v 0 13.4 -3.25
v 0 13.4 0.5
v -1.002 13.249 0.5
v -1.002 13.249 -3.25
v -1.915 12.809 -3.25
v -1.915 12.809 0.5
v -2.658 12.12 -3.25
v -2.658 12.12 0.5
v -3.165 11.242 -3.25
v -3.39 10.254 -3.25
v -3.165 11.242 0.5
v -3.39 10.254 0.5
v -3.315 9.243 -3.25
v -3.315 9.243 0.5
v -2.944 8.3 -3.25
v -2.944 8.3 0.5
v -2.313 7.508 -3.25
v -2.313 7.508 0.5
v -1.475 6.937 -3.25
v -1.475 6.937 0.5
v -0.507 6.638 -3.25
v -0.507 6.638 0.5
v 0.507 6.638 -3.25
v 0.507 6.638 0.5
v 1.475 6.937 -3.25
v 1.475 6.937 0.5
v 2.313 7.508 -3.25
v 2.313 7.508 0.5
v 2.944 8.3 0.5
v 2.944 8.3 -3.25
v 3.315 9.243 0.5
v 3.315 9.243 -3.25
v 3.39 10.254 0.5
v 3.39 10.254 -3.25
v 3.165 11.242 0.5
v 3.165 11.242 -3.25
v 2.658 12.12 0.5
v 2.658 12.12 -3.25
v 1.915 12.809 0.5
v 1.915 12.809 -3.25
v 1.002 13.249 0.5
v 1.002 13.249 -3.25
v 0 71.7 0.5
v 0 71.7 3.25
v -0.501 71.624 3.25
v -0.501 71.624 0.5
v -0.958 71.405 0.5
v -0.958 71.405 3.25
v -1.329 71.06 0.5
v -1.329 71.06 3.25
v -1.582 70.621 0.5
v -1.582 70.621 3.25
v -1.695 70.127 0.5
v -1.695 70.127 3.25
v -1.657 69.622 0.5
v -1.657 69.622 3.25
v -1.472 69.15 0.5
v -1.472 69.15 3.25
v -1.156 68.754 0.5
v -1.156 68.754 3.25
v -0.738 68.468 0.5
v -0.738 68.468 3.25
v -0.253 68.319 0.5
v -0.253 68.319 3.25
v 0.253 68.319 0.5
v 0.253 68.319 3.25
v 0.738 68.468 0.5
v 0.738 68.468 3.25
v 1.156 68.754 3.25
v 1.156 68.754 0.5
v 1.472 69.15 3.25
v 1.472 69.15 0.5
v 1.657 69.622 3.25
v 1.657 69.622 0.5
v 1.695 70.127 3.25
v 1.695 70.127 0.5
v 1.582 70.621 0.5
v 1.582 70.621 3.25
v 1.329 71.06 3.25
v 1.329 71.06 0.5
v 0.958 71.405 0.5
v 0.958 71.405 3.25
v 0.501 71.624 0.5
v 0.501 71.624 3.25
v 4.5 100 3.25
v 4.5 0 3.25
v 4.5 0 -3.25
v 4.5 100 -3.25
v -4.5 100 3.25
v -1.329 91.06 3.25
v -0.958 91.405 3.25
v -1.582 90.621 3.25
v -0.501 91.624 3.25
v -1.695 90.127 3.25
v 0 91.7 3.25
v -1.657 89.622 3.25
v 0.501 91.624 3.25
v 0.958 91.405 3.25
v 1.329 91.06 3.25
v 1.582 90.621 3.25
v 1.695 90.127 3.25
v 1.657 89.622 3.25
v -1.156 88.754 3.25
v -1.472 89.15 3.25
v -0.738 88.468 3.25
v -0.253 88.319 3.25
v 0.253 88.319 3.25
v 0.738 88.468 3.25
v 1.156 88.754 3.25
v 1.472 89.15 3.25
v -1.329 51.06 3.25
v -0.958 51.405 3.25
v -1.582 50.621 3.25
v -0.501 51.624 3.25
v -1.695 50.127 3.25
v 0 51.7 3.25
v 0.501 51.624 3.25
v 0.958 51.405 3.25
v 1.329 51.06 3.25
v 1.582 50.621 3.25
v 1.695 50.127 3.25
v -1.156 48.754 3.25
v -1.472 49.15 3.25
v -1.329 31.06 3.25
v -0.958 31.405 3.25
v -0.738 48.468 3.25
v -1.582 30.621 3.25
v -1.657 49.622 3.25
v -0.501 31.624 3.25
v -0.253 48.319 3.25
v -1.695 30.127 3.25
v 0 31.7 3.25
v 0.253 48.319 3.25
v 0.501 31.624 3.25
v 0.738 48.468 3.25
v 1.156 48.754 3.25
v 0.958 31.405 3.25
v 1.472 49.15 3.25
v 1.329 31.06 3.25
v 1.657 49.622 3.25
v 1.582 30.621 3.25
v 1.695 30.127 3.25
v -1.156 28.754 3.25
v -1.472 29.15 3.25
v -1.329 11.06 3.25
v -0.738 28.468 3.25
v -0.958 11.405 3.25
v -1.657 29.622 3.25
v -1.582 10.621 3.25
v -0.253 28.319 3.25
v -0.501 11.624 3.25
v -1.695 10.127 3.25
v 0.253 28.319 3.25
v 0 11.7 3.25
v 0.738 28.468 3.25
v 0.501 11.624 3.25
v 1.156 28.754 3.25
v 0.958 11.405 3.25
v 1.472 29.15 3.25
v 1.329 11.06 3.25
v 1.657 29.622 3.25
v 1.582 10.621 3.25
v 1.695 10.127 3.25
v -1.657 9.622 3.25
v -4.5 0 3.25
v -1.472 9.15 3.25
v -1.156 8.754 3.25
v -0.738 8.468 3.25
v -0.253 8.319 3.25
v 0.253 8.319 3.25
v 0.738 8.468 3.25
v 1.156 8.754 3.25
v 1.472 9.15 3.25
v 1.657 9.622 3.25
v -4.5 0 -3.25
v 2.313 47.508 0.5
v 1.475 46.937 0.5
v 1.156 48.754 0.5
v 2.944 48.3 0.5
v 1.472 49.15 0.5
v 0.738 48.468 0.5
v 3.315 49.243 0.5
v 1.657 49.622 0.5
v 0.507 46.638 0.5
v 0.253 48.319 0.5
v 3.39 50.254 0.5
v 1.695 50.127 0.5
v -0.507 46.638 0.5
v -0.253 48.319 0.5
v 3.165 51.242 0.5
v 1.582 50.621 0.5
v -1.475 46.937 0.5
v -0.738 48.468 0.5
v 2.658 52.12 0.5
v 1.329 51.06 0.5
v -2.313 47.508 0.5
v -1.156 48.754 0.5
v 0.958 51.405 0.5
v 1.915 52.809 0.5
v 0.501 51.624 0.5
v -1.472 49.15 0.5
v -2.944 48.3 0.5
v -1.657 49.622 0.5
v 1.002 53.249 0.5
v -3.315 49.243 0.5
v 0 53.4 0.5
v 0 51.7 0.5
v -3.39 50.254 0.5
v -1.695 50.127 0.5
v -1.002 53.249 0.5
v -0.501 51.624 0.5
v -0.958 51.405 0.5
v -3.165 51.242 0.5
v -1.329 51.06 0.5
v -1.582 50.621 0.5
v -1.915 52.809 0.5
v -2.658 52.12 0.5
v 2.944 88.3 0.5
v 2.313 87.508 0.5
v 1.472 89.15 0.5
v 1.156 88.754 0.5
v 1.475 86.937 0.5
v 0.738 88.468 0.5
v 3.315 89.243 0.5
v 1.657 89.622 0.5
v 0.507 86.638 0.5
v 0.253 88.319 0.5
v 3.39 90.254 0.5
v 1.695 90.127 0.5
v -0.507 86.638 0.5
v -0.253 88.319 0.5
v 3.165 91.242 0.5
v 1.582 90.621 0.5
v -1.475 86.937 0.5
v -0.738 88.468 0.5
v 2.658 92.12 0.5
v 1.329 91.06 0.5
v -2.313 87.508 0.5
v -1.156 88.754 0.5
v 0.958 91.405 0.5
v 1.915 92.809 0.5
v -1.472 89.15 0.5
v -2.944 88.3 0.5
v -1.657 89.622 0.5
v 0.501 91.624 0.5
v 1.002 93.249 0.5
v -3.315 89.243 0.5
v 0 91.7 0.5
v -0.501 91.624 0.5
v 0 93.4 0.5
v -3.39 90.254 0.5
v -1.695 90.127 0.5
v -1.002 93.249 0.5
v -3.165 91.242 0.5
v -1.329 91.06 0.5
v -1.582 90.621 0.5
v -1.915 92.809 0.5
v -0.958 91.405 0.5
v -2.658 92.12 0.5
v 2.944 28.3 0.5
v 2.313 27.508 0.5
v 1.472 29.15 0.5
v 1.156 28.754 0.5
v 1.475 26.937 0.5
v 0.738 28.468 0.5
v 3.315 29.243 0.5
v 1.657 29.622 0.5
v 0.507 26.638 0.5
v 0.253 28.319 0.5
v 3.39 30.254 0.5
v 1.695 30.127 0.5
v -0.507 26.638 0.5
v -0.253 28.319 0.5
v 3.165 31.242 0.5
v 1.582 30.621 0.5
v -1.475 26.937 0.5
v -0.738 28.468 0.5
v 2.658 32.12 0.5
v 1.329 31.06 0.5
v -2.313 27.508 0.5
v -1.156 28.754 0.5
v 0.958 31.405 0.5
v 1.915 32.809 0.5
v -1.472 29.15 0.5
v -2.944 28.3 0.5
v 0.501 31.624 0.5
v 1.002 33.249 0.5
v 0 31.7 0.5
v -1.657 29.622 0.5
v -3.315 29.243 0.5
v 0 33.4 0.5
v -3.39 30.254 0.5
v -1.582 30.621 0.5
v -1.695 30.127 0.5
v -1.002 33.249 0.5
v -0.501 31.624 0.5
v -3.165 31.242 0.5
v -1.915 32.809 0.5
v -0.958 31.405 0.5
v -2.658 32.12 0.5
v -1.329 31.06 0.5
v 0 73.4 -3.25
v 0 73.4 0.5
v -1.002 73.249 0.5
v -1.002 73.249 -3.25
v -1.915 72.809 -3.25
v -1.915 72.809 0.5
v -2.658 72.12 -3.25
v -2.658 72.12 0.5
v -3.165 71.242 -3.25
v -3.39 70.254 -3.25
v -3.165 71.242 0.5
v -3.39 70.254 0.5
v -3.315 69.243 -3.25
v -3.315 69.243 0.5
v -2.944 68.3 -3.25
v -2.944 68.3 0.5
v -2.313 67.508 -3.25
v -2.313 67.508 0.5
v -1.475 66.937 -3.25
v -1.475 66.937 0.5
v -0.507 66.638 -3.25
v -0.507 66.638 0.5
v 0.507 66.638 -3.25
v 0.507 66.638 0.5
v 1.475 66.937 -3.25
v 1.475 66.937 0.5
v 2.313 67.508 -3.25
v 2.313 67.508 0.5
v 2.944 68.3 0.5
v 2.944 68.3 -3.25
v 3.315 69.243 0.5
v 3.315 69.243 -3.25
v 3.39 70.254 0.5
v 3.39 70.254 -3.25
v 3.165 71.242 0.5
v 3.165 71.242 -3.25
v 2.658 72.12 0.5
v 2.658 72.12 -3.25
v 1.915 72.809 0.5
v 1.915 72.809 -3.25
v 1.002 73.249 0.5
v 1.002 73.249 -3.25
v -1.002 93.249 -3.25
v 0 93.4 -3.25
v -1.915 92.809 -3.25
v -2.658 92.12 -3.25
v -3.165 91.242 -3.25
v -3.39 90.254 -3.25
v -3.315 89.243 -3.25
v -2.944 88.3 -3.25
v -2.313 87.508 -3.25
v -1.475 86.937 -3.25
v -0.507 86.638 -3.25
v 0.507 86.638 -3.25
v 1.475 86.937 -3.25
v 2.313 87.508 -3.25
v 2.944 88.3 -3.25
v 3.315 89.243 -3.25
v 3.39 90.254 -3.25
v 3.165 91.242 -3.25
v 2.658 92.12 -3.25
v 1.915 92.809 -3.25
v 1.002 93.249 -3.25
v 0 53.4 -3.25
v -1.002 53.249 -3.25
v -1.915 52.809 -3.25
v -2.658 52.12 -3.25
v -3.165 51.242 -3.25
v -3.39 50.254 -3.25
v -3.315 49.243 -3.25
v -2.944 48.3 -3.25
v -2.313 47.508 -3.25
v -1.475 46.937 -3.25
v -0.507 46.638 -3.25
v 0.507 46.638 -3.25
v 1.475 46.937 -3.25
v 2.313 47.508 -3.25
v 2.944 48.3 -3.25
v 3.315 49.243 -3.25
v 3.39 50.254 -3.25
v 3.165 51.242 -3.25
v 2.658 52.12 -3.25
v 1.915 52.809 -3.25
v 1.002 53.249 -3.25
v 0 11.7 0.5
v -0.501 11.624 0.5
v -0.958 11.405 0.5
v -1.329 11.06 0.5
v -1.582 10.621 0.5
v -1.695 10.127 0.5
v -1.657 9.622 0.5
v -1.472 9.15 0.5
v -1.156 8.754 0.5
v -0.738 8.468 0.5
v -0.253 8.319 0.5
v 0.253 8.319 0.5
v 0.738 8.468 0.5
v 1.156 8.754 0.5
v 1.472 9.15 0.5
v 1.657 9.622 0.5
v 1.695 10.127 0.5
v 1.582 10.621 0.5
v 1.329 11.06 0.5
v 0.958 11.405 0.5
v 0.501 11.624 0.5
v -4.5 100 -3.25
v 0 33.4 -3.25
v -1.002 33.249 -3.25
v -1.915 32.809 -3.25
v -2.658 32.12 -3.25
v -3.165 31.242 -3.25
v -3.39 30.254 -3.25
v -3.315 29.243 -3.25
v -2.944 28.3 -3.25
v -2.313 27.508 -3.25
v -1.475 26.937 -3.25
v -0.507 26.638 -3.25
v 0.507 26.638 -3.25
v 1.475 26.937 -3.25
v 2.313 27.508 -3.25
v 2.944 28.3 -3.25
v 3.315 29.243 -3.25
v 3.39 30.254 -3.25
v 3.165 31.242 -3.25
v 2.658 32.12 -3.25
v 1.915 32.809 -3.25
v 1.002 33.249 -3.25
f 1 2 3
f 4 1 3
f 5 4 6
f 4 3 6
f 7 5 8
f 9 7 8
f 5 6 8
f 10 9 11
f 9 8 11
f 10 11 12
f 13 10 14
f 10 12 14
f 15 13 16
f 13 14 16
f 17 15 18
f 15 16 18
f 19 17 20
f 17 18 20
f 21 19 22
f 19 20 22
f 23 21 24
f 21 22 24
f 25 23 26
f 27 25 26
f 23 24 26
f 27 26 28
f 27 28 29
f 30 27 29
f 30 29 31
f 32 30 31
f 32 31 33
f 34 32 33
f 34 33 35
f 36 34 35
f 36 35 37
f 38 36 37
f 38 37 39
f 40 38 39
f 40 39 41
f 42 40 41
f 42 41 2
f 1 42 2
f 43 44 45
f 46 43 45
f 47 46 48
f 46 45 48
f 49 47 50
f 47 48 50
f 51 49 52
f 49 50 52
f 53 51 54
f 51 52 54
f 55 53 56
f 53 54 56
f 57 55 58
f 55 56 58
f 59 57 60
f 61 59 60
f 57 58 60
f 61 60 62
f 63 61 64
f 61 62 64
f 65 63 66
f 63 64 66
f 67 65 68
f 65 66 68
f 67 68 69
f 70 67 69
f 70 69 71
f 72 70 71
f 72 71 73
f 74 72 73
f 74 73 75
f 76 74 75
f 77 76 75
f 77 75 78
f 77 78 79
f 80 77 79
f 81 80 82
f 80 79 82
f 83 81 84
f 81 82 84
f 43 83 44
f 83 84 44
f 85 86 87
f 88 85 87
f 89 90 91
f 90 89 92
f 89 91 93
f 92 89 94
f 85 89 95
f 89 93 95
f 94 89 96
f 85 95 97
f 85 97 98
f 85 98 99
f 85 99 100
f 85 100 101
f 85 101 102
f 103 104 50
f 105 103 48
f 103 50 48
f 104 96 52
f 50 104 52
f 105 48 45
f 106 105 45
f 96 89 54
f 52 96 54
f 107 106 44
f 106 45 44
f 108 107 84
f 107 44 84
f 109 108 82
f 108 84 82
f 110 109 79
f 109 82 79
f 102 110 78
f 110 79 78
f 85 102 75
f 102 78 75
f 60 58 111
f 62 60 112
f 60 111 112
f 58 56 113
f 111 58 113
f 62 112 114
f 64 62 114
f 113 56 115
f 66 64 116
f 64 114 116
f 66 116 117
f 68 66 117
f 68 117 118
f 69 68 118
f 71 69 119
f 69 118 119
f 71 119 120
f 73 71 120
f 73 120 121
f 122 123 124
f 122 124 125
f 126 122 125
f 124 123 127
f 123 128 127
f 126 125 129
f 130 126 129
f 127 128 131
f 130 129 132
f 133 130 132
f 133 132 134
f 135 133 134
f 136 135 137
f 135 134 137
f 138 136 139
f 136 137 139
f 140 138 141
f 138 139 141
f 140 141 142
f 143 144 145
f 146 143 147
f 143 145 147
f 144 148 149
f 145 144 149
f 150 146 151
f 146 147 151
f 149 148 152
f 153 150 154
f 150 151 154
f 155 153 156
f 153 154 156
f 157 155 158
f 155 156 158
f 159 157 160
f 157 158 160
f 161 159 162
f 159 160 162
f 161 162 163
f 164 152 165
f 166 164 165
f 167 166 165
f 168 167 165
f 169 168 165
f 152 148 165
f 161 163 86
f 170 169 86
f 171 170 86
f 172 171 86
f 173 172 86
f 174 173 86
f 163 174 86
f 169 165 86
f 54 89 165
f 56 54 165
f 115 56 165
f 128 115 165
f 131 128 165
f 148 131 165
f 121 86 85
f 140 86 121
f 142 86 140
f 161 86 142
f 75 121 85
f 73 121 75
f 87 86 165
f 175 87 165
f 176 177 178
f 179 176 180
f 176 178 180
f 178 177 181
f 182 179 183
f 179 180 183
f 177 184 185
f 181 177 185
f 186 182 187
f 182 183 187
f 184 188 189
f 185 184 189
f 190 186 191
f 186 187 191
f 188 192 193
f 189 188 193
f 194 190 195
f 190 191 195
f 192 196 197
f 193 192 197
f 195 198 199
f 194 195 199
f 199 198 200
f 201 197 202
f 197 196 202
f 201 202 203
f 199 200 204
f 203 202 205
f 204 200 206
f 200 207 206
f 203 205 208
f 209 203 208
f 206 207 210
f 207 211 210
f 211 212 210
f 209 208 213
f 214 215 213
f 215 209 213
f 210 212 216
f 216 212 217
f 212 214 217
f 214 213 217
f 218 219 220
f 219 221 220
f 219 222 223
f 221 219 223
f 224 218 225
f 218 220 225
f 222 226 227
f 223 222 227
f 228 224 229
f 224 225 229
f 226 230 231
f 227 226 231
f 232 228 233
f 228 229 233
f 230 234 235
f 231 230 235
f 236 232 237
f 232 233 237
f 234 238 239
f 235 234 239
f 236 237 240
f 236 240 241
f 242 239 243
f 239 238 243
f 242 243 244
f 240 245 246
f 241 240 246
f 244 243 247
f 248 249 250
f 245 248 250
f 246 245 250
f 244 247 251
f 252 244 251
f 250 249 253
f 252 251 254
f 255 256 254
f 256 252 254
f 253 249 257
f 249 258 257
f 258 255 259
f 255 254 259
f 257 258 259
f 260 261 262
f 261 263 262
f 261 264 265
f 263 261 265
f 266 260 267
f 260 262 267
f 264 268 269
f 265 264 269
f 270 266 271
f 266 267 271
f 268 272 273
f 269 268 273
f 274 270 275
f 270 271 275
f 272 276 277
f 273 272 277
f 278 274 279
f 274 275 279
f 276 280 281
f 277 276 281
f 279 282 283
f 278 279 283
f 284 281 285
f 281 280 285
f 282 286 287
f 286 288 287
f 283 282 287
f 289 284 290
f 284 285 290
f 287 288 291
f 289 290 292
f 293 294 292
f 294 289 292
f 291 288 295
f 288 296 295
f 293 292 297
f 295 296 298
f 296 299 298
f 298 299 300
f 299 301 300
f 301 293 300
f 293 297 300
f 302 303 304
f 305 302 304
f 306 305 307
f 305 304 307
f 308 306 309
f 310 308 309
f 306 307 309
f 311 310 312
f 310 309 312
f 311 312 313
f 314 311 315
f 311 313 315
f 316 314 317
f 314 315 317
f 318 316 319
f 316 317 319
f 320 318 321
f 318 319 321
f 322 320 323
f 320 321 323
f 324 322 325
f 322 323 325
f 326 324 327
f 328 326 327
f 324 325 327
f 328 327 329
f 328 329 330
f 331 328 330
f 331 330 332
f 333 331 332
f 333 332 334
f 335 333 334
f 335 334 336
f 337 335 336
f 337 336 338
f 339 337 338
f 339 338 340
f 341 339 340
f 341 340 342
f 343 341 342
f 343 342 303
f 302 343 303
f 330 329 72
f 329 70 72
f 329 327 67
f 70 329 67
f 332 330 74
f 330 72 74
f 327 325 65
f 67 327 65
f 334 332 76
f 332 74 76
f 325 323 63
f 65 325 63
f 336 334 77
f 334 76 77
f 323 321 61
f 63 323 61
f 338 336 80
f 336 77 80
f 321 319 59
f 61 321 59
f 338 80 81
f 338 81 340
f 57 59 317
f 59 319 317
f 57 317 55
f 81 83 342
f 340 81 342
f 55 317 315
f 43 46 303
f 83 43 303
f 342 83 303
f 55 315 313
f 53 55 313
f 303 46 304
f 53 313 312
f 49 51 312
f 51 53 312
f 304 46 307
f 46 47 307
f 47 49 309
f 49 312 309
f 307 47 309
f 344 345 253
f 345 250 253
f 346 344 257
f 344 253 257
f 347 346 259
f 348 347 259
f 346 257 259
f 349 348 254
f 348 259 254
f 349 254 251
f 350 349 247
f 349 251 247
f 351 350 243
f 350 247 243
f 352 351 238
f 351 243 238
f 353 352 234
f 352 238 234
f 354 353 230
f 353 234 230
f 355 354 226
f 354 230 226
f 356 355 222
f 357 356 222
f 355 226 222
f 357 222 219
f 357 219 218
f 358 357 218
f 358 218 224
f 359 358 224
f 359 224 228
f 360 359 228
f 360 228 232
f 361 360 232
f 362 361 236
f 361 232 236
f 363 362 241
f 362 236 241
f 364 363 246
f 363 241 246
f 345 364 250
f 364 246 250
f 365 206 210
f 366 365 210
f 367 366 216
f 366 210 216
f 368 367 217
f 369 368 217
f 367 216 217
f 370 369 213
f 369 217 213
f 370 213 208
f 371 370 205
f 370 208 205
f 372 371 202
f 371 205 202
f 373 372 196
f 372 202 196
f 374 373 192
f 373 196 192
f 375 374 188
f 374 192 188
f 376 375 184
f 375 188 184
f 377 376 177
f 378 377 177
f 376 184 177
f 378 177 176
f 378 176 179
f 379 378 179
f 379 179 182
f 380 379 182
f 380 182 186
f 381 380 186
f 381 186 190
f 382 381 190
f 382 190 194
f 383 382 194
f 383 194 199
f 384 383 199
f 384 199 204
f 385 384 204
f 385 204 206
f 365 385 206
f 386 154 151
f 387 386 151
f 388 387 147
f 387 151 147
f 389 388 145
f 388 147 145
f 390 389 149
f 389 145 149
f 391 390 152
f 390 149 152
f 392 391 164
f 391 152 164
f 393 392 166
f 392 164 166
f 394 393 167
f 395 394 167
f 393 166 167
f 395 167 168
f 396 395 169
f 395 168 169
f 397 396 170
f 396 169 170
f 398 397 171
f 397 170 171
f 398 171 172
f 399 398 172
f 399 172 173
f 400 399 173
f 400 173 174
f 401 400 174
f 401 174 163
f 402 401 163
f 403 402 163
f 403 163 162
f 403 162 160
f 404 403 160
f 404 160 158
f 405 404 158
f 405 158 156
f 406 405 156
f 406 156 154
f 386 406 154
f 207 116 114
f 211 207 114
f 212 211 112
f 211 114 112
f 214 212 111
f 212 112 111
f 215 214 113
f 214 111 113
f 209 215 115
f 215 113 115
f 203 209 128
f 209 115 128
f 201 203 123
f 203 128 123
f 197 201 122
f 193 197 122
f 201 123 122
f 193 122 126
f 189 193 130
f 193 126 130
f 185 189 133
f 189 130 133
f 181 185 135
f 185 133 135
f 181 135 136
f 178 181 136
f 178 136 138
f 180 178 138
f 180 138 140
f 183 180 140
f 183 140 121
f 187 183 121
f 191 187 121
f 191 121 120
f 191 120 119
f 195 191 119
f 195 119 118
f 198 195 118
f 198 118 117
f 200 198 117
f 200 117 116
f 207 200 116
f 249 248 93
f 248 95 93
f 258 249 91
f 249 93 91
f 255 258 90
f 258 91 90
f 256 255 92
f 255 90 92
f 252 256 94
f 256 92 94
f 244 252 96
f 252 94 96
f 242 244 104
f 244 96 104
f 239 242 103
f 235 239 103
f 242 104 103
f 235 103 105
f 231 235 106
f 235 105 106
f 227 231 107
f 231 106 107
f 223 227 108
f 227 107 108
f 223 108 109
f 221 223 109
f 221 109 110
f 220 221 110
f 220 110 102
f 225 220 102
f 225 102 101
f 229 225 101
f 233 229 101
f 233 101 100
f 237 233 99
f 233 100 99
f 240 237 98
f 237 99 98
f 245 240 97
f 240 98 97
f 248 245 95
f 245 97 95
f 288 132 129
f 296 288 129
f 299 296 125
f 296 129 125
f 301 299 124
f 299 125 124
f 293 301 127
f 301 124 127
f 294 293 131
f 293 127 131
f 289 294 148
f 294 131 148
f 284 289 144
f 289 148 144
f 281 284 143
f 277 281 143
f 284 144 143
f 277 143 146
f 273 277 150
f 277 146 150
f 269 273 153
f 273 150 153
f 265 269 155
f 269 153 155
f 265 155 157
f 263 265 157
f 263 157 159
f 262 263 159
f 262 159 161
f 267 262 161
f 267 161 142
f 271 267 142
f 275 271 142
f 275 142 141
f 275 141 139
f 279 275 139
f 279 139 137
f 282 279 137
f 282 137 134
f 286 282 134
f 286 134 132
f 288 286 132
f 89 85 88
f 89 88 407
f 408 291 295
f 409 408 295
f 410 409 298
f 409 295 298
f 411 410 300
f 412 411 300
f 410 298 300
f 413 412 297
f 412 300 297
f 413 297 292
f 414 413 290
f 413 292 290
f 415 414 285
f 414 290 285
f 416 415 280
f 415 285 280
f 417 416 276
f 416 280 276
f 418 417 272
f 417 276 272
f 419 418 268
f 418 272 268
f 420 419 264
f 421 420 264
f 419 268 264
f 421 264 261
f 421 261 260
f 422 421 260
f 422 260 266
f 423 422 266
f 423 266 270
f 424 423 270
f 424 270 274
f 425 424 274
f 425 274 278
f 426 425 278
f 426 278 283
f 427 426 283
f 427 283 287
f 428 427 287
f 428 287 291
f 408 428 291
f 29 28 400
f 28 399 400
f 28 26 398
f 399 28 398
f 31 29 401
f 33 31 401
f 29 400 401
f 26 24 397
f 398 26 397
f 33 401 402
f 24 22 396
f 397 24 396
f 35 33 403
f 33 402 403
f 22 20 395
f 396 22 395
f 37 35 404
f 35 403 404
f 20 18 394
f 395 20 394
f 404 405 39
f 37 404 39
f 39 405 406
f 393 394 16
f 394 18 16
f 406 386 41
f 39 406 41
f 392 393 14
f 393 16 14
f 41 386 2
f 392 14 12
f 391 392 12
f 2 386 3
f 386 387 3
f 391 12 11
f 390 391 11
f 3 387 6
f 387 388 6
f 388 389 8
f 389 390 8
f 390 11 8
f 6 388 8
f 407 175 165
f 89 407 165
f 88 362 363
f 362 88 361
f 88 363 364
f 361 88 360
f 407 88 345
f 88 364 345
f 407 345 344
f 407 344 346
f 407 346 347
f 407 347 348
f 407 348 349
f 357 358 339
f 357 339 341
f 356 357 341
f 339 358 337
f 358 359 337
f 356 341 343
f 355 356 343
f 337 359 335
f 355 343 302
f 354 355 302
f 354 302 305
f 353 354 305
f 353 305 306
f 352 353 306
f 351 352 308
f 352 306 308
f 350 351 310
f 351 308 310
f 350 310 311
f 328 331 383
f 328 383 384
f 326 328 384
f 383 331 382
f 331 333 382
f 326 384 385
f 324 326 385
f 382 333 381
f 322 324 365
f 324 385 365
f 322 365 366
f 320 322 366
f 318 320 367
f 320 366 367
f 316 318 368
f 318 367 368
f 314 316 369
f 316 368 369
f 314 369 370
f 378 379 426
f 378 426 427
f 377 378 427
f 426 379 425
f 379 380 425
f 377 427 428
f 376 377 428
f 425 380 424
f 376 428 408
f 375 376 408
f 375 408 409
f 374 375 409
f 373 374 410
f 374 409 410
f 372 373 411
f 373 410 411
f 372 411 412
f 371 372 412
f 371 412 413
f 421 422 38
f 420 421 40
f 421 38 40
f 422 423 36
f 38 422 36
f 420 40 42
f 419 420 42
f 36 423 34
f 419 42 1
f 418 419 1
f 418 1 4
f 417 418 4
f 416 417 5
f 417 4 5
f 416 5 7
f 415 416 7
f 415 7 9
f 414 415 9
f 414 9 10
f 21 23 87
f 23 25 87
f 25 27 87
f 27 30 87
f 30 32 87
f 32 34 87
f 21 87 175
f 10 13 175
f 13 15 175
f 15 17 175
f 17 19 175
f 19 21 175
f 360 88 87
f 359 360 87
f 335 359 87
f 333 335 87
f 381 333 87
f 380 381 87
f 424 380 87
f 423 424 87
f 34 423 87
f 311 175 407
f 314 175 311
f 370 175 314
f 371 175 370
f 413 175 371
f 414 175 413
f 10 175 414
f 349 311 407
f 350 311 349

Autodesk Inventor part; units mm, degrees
ref_plane "YZ Plane" through (0, 0, 0) normal (1, 0, 0) x (0, 1, 0)
ref_plane "XZ Plane" through (0, 0, 0) normal (0, 1, 0) x (-1, 0, 0)
ref_plane "XY Plane" through (0, 0, 0) normal (0, 0, 1) x (1, 0, 0)
sketch "Sketch1" plane through (0, 0, 0) normal (0, 1, 0) x (-1, 0, 0)
  line L0 (-4.5, -3.25) -> (4.5, -3.25)
  line L1 (4.5, -3.25) -> (4.5, 3.25)
  line L2 (4.5, 3.25) -> (-4.5, 3.25)
  line L3 (-4.5, 3.25) -> (-4.5, -3.25)
  line L4 (-4.5, -3.25) -> (4.5, 3.25) construction
  line L5 (4.5, -3.25) -> (-4.5, 3.25) construction
  point P0 (0, 0)
  dimension "d0" = 9
  dimension "d1" = 6.5
extrude "Extrusion1" add sketch "Sketch1" along normal blind 100
sketch "Sketch2" plane through (4.5, 0, -3.25) normal (0, 0, -1) x (-1, 0, 0)
  line L0 (0, 0) -> (9, 0) construction
  line L1 (9, 0) -> (9, 100) construction
  line L2 (0, 100) -> (9, 100) construction
  line L3 (0, 0) -> (0, 100) construction
  line L4 (9, 100) -> (0, 100) projected
  line L5 (4.5, 100) -> (4.5, 0) construction
  point P0 (4.5, 90)
  point P1 (4.5, 70)
  point P2 (4.5, 50)
  point P3 (4.5, 30)
  point P4 (4.5, 10)
  dimension "d4" = 20
  dimension "d5" = 20
  dimension "d6" = 20
  dimension "d7" = 20
  dimension "d9" = 10
  dimension "d10" = 10
hole "Hole1" at (0, 90, -3.25) at (0, 70, -3.25) at (0, 50, -3.25) at (0, 30, -3.25) at (0, 10, -3.25) direction (0, 0, 1) diameter 3.4 depth 8 counterbore diameter 6.8 counterbore depth 3.75 clearance for "Hex Head Cap Screw DIN EN 24017" size "M3" standard "DIN"
equation "\"d5\" = d4"
equation "\"d6\" = d5"
equation "\"d7\" = d4"
equation "\"d9\" = d10"
properties part number "LinearRail" material "Steel, Carbon"
